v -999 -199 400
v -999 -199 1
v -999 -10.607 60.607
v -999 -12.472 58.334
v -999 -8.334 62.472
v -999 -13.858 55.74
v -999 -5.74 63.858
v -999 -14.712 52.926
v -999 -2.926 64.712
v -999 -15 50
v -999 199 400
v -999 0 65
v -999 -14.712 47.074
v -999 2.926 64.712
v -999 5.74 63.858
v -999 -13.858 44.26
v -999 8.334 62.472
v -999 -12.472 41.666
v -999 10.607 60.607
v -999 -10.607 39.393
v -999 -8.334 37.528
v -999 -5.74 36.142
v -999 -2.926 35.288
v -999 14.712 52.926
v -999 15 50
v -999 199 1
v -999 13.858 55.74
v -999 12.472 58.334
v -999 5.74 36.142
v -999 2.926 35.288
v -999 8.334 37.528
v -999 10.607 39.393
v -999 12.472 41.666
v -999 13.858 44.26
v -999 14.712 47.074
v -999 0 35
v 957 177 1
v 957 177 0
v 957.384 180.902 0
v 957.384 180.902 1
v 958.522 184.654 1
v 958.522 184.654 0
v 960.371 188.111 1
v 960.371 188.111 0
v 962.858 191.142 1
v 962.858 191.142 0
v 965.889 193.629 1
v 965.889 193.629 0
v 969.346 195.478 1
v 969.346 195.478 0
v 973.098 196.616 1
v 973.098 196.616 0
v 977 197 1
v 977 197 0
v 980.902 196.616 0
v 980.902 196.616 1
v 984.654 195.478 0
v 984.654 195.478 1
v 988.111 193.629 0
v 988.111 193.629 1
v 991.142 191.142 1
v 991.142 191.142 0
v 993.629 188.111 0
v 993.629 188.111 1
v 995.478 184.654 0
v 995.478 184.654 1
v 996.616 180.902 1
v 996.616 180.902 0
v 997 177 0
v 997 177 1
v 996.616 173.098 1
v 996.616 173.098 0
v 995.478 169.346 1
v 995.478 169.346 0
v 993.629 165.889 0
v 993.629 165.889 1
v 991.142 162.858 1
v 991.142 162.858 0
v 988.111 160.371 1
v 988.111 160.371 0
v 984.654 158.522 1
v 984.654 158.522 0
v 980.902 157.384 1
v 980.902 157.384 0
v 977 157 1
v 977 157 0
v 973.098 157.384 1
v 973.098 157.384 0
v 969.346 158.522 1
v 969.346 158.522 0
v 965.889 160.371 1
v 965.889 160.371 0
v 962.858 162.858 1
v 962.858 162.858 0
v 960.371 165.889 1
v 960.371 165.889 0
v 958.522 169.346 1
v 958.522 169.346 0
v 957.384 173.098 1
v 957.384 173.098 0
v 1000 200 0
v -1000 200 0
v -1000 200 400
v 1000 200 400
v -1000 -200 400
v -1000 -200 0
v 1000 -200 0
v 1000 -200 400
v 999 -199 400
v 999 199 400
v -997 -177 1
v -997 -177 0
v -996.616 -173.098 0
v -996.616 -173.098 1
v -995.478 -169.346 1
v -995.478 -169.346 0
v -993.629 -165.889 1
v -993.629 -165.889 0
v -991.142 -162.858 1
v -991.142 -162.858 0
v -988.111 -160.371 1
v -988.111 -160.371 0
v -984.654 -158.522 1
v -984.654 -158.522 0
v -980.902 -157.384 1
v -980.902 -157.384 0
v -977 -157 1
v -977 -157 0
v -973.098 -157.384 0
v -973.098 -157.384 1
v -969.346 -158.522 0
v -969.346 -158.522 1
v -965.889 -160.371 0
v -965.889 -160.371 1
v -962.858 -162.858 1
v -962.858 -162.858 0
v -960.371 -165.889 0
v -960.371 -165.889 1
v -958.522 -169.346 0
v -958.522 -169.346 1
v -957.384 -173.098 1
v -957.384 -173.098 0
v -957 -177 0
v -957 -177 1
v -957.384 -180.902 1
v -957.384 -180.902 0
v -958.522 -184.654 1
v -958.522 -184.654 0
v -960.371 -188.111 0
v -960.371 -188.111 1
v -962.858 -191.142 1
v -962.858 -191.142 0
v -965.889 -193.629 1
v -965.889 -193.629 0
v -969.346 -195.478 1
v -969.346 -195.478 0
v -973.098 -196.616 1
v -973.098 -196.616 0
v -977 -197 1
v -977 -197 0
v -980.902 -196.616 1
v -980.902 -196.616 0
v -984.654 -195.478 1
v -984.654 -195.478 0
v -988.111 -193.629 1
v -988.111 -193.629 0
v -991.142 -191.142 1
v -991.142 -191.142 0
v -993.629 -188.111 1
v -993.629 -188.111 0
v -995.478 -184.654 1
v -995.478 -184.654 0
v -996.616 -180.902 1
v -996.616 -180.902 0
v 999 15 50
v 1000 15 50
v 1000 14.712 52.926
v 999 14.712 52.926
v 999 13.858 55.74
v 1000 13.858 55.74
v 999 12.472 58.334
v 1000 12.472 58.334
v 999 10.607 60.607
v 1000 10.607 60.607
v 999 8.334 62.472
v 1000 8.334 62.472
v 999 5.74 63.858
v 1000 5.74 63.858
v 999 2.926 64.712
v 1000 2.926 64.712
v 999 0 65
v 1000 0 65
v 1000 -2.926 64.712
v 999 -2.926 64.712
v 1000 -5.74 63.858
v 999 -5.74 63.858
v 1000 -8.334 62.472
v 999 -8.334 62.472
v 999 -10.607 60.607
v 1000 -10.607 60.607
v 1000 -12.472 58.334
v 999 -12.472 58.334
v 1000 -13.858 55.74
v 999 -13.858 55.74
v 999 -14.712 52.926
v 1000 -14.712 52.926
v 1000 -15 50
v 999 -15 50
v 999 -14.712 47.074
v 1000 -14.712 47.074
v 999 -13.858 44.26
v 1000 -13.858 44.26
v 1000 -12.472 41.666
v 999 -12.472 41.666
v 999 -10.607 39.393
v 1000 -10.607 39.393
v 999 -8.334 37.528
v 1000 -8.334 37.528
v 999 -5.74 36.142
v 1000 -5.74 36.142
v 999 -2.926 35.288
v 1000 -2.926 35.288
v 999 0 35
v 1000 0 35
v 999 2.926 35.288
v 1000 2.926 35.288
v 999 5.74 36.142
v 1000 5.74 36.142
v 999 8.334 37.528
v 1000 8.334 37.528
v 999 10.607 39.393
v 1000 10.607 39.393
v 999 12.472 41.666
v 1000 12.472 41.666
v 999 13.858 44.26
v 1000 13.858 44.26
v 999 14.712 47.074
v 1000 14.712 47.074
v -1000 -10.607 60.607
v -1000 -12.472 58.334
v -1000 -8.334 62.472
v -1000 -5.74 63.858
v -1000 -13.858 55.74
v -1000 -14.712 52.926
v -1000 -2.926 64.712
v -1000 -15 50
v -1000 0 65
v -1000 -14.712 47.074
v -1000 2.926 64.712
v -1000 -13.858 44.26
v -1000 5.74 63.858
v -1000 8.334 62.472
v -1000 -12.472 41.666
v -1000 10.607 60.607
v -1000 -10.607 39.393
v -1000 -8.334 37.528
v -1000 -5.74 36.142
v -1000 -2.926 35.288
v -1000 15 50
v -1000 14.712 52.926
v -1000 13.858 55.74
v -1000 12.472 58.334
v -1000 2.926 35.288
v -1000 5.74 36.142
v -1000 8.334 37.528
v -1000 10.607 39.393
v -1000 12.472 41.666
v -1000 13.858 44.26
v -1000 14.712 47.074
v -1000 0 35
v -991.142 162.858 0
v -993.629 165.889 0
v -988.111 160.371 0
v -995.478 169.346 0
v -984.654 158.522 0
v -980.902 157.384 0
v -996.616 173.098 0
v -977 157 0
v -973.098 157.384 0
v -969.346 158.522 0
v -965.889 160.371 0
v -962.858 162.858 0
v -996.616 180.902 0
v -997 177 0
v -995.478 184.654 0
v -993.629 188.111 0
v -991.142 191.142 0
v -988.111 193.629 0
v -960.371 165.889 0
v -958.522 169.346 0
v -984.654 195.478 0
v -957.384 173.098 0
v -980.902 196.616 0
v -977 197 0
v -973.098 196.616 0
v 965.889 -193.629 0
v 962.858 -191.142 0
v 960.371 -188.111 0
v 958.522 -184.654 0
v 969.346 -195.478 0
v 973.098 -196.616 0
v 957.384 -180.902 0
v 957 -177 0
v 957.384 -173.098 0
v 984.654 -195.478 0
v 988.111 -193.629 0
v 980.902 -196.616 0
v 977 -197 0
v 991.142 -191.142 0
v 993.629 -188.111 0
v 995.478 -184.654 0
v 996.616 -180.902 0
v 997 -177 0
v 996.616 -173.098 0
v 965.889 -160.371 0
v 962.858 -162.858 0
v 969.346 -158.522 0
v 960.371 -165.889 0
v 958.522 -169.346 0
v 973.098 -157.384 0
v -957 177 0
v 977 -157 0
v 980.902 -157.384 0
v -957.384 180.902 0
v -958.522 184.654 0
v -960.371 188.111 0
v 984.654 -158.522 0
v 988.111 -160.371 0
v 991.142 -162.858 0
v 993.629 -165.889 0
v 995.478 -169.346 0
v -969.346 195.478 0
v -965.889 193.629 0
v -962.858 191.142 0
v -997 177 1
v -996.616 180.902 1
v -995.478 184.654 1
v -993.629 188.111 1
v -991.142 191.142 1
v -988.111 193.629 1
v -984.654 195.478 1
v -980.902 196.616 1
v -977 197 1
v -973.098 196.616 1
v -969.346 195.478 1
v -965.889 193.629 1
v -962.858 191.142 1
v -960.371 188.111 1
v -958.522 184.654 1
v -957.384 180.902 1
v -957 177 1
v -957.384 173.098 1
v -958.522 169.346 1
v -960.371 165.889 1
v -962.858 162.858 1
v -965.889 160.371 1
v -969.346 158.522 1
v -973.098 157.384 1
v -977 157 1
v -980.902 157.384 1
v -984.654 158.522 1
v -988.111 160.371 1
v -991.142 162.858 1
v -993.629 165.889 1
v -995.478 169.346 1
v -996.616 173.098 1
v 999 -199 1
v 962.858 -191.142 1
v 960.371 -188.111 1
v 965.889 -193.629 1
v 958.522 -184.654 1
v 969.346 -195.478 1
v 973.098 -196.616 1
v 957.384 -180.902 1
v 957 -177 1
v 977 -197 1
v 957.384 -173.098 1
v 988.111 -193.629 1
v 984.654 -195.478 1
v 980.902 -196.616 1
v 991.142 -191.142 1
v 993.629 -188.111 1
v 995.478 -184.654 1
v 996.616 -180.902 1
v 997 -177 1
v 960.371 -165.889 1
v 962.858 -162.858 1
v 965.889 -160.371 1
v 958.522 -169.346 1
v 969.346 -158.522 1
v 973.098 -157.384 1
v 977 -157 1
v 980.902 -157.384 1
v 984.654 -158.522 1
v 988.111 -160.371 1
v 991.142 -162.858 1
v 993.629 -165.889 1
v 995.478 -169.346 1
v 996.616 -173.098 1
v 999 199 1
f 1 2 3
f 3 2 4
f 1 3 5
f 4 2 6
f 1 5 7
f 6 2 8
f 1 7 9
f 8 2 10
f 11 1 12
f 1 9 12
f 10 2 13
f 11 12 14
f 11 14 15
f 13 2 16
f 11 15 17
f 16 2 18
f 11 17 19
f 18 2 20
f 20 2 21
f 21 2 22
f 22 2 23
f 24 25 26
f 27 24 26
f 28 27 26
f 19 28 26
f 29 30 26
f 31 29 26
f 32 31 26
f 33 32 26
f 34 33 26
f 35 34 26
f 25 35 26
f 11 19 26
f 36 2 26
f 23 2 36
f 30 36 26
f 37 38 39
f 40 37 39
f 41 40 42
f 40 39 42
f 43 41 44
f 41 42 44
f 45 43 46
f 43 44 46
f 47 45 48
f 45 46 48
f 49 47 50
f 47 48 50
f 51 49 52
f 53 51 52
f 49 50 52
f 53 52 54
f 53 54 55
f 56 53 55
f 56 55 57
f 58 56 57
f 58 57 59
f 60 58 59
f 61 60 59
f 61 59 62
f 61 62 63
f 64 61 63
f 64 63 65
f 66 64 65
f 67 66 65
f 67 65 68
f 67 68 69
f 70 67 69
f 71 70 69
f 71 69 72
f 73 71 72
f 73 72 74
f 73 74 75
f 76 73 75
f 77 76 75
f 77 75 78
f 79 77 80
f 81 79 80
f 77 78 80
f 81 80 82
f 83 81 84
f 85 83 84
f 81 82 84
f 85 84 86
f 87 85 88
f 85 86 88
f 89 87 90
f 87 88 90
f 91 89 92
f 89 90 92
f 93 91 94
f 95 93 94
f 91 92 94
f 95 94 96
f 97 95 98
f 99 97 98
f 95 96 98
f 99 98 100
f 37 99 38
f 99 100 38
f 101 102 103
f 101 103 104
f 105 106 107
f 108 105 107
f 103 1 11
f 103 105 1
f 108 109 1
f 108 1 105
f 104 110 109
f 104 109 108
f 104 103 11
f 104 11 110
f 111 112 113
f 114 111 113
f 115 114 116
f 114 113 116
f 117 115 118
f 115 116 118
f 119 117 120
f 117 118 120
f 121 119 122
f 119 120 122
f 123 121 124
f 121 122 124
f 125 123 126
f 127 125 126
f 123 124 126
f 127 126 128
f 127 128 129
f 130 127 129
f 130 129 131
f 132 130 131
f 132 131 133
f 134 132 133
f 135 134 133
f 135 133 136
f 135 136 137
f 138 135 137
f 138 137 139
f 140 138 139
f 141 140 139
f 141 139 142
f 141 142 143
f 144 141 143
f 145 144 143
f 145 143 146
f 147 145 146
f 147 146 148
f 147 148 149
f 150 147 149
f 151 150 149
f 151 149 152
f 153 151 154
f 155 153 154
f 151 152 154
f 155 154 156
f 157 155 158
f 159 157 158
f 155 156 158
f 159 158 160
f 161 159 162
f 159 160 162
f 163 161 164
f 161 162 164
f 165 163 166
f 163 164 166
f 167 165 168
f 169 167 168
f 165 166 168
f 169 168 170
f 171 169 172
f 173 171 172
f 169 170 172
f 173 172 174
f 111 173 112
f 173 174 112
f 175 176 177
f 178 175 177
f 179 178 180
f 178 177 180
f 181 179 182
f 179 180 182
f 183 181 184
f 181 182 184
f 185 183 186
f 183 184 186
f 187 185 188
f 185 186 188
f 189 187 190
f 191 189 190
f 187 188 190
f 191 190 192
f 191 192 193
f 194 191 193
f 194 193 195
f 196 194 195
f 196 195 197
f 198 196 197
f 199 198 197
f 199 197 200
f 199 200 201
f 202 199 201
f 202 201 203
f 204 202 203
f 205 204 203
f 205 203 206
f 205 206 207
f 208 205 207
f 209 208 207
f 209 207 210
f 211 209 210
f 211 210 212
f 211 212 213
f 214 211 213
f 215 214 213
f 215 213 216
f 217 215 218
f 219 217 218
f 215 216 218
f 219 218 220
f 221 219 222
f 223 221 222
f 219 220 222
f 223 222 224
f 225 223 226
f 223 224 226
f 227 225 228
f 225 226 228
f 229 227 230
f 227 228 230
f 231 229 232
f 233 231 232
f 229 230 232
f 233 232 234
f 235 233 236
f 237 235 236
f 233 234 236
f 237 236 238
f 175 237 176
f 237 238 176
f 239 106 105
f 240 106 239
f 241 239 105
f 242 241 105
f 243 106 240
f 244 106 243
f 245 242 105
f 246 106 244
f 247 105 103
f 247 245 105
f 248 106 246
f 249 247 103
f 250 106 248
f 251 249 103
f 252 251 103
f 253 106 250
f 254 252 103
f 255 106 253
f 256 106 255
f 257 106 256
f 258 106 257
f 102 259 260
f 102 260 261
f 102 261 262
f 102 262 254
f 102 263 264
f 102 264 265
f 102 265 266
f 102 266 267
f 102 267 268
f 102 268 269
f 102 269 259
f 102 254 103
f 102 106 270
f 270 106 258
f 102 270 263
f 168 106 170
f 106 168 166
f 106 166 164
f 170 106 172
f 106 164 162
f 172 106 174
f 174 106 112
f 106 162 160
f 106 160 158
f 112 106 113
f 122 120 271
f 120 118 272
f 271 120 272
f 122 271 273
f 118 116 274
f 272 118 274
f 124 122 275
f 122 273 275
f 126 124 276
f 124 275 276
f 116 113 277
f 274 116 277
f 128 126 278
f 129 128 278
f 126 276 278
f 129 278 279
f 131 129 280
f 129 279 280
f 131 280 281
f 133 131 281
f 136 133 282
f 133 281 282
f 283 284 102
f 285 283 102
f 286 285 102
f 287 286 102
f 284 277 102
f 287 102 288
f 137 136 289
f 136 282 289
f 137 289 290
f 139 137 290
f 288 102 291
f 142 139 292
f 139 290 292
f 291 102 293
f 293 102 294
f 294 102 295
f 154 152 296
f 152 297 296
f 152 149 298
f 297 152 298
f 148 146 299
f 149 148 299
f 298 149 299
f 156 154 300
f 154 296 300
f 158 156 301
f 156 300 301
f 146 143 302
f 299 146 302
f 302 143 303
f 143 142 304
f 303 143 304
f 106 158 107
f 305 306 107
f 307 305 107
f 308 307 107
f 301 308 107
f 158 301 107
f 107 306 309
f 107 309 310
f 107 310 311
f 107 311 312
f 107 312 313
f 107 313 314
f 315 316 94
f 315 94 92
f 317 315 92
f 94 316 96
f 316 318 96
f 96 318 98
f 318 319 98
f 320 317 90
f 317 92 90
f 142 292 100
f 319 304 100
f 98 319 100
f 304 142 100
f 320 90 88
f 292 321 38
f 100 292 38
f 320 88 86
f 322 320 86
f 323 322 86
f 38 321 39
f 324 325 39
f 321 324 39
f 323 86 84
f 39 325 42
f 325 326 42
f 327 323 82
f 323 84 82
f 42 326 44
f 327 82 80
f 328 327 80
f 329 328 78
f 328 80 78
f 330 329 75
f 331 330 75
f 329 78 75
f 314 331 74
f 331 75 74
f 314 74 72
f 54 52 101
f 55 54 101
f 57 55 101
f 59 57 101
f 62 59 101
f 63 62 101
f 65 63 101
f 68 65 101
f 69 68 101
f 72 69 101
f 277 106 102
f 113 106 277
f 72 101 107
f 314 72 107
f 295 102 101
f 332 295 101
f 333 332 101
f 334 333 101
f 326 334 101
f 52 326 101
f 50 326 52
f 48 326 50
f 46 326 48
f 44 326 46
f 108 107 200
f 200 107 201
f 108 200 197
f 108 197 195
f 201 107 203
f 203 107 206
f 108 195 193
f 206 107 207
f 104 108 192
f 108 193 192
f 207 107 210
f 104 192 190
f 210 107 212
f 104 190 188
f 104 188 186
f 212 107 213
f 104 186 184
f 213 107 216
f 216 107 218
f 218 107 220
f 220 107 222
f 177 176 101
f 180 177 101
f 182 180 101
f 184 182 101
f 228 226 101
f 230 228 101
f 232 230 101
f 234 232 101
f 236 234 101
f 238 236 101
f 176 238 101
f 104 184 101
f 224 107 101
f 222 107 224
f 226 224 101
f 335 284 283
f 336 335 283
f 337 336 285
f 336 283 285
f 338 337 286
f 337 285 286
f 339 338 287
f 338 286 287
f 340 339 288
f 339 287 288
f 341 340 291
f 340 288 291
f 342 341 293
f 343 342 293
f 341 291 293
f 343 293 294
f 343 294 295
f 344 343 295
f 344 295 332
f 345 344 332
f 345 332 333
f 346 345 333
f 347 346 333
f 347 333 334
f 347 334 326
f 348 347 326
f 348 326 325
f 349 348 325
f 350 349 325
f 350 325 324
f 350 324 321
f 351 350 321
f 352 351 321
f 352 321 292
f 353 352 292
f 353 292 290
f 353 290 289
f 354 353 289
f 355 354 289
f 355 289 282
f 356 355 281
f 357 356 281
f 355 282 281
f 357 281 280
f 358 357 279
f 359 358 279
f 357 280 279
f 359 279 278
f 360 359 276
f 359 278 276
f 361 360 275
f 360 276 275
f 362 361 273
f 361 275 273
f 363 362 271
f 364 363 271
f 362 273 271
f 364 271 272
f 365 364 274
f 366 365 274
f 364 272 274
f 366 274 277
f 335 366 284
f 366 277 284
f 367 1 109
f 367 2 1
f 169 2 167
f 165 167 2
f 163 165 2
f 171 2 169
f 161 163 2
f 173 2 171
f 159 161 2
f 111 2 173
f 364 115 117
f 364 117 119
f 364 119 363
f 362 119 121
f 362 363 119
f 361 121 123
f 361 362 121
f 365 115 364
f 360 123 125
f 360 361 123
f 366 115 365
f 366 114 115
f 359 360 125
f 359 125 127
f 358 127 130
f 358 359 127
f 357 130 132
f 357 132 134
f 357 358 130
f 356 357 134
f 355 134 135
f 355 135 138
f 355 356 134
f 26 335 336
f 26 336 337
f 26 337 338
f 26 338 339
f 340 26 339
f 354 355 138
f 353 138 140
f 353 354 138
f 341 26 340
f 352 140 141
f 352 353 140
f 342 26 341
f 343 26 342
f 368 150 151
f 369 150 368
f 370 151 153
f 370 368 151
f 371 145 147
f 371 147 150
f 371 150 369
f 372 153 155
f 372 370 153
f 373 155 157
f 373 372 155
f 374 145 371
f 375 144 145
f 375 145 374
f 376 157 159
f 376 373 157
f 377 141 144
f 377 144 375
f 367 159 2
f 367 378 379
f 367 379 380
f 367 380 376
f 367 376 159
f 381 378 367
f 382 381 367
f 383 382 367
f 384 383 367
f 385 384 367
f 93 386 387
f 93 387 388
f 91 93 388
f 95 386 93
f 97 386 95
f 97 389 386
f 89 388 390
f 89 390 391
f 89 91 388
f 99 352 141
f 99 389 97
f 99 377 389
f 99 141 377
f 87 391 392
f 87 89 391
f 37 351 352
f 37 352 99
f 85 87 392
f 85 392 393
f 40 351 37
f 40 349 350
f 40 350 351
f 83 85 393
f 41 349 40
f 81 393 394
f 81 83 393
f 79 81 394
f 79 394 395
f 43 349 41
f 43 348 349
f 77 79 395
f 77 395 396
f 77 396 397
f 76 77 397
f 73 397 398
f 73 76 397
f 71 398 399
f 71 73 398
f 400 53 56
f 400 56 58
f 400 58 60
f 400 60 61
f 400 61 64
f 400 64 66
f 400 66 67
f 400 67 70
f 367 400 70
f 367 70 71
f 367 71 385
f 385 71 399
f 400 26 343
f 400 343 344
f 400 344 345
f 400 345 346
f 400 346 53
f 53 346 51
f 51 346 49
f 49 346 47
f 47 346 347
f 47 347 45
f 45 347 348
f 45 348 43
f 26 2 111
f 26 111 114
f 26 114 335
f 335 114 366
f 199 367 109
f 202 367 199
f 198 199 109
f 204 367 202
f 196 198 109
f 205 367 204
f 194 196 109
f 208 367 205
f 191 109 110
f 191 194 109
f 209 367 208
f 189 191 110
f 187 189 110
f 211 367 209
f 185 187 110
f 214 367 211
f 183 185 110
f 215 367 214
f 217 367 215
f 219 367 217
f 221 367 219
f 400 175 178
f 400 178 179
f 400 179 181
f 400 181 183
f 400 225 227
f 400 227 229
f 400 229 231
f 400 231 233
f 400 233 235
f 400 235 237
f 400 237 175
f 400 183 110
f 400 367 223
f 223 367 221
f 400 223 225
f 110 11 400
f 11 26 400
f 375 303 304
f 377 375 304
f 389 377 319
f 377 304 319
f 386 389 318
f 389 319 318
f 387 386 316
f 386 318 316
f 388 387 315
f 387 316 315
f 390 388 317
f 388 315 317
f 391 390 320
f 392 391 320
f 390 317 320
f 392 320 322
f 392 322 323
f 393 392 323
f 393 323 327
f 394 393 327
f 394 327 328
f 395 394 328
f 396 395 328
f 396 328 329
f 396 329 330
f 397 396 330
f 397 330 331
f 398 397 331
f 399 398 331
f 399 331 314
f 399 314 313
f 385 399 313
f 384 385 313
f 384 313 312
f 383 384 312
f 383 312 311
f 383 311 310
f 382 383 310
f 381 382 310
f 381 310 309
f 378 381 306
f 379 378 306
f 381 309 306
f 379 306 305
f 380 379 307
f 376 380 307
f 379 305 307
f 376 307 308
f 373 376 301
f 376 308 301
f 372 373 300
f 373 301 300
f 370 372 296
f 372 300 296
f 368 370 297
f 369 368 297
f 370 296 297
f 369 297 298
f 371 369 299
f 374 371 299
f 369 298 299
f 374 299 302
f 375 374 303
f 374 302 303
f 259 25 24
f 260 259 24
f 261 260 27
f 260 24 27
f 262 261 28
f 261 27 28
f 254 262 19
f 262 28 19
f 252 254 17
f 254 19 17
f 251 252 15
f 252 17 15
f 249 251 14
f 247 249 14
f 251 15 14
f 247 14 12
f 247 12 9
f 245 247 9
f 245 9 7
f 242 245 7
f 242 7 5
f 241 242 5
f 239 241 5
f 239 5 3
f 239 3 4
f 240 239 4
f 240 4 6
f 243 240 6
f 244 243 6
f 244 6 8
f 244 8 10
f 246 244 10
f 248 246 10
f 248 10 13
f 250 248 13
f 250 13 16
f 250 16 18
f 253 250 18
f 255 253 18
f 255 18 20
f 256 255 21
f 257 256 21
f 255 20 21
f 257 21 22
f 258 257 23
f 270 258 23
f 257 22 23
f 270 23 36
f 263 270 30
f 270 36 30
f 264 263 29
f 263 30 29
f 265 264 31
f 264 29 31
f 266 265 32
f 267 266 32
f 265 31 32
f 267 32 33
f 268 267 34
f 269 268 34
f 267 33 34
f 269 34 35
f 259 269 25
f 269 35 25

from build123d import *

# Parameters (mm, degrees)
F0_W     = 2000
F0_H     = 400
F1_DEPTH = 400
F2_T     = -1
F5_D     = 40
F8_D     = 30


# Not quite as in the source:
# - the program builds the solid bodies; features that only make, move or delete a surface that nothing else refers to are left out


with BuildPart() as f1:
    # F0 (on Top) → F1 (new body)
    with BuildSketch(Plane.XY):
        Rectangle(F0_W, F0_H)
    extrude(amount=F1_DEPTH)

    # F2
    f2_openings = [f1.faces().sort_by_distance(p)[0] for p in [
        (0, 0, 400),
    ]]
    offset(amount=F2_T, openings=f2_openings)

    # F5 (through all)
    with Locations(Plane.XY.offset(1)):
        with Locations((977, 177), (977, -177), (-977, 177), (-977, -177)):
            Hole(F5_D / 2)

    # F8 (through all)
    with Locations(Plane(origin=(-1000, 0, 0), x_dir=(0, -1, 0), z_dir=(-1, 0, 0))):
        with Locations((0, 50)):
            Hole(F8_D / 2)


solid = f1.part
